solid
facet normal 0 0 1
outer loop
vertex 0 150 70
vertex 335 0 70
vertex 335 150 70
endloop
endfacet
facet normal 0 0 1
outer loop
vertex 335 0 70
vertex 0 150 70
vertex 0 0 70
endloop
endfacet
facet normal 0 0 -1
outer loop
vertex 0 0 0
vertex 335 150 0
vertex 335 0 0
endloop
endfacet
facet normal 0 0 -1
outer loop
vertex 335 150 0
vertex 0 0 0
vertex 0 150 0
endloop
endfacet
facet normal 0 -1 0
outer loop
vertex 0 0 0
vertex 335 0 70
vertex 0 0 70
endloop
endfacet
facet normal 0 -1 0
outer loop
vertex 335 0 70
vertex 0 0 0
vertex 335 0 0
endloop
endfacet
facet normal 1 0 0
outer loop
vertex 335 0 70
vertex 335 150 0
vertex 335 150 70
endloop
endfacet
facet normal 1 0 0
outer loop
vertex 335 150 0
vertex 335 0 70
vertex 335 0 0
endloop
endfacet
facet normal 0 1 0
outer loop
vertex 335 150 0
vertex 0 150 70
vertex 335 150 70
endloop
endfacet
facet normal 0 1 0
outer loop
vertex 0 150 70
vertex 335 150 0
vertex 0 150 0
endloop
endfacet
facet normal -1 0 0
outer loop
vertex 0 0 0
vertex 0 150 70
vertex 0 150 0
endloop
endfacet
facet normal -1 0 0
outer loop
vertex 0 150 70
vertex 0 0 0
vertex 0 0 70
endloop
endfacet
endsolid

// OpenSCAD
// Render Precision
$fn=50;

// Variables 
tolerance = 25;

wall = 5;
floor = 5;
ceiling = 10;

bottom_switch_height = 30 + tolerance;
bottom_switch_depth= 120 + tolerance;
bottom_switch_width= 300 + tolerance;
bottom_switch_cable = 68;

top_sub_height= 230 + tolerance;
top_sub_depth = 140 + tolerance;
top_sub_width= 230 + tolerance;

module base(){
	cube([bottom_switch_width + 2*wall,
		bottom_switch_depth + wall,
		bottom_switch_height+floor+ceiling]); 
}

base();
